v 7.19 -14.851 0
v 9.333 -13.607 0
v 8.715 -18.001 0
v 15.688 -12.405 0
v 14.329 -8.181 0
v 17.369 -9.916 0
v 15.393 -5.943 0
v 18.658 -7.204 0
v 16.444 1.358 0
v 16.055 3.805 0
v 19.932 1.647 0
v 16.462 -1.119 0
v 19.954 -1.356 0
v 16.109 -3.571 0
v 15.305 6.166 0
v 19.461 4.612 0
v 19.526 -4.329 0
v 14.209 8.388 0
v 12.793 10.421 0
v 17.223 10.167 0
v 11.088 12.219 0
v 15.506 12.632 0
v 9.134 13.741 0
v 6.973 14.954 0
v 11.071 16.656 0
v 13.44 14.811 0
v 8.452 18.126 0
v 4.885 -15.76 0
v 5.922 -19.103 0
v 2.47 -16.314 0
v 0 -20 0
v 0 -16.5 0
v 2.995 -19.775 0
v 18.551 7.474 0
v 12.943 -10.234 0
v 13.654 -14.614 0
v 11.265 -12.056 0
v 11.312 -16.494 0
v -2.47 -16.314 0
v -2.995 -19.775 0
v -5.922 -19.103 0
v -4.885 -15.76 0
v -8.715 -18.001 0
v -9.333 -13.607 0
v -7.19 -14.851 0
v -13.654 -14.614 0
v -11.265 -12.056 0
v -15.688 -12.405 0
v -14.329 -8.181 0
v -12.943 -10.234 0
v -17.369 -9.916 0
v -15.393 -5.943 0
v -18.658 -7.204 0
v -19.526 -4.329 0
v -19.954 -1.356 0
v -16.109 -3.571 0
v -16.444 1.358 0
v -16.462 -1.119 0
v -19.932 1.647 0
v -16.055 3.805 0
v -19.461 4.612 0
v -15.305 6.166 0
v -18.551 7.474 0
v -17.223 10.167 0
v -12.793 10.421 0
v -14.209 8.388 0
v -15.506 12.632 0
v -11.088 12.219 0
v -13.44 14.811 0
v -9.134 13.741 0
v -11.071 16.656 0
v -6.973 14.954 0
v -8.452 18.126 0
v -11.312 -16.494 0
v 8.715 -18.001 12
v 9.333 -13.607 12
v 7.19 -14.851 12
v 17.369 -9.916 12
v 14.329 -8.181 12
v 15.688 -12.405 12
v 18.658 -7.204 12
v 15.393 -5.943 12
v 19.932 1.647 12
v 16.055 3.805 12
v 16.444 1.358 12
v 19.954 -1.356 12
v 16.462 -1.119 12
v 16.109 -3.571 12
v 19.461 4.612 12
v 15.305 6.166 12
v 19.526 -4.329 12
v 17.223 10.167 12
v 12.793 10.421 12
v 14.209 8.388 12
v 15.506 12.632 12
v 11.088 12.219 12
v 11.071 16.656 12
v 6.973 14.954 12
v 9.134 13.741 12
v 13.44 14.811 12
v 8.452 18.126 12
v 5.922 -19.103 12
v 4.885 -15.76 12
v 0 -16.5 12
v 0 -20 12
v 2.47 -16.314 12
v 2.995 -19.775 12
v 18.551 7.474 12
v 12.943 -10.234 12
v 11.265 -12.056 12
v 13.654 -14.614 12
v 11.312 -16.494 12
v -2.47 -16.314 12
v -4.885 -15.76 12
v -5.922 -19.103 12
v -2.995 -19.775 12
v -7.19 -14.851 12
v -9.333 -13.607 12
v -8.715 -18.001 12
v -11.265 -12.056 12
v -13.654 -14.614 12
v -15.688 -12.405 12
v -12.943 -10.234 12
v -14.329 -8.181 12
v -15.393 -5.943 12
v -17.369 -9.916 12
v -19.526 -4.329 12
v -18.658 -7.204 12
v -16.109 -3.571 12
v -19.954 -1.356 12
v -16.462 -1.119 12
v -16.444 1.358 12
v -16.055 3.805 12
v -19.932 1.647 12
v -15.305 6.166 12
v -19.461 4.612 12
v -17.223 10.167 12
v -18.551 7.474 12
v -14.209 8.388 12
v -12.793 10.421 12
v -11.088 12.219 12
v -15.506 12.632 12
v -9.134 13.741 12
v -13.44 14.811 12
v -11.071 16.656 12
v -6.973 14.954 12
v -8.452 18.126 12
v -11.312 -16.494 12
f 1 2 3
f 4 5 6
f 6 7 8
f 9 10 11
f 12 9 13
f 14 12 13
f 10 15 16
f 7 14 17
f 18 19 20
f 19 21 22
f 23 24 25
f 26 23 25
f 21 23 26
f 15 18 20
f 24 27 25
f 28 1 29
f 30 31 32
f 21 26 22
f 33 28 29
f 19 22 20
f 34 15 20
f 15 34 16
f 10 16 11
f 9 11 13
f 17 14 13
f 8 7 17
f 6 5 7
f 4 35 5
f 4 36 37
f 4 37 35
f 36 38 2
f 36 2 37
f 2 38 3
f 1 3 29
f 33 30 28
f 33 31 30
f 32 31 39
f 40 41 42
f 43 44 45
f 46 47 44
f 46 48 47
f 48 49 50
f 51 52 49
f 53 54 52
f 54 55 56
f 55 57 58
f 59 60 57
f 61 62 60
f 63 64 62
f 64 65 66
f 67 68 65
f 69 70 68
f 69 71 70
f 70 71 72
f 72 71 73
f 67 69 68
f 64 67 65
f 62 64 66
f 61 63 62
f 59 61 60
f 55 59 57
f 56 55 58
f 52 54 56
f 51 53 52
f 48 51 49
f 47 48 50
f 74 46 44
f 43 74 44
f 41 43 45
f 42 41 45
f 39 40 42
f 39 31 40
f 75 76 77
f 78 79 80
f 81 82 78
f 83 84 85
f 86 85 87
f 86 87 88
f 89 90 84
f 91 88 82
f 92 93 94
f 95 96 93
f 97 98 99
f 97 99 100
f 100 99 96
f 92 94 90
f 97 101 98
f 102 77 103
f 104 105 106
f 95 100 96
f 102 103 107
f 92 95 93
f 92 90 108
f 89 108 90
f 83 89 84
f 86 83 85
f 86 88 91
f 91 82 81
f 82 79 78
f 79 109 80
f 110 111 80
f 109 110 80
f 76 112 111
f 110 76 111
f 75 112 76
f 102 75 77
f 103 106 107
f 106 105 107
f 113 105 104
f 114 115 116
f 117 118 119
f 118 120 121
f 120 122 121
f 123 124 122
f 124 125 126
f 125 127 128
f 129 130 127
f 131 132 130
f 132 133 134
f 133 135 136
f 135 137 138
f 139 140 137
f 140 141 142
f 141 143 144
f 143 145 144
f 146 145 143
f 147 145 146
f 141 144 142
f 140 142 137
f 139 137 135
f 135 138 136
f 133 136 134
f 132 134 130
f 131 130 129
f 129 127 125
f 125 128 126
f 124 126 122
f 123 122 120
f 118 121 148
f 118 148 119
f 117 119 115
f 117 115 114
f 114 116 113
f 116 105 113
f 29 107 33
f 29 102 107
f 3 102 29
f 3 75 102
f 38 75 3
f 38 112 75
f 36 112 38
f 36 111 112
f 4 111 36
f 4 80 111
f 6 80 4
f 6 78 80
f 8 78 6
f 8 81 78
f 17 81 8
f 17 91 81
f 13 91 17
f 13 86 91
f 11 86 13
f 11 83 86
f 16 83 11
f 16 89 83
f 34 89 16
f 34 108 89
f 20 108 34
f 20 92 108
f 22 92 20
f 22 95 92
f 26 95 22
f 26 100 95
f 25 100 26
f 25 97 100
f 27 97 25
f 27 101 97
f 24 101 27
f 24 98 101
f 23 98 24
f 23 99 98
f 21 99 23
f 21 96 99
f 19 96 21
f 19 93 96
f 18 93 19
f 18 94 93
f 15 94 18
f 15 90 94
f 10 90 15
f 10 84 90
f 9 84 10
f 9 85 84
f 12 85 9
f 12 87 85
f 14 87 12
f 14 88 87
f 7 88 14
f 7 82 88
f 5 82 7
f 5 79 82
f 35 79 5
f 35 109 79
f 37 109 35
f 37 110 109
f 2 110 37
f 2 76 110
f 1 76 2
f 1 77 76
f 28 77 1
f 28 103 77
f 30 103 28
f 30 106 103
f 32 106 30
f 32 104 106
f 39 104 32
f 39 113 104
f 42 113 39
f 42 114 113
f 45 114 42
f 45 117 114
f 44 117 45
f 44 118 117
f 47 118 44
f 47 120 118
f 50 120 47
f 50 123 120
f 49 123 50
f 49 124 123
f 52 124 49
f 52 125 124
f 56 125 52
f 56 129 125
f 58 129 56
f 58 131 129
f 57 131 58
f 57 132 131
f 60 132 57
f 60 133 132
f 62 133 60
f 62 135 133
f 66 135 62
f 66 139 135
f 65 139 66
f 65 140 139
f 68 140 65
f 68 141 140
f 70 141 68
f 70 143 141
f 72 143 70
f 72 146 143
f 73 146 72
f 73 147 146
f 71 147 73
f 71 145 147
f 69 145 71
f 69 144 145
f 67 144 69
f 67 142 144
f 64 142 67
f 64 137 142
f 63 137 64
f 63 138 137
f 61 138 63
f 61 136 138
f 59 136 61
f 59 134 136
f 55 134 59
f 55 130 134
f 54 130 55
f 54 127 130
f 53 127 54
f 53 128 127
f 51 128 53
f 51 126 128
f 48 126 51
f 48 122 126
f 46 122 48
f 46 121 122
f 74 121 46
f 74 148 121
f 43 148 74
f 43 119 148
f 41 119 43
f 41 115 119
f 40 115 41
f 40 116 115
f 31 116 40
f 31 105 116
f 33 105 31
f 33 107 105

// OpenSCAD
$fn = 32;

// ----------------------------------------------------------------------
// Spring clip: 40 mm outside, 3.5 mm band, 50 degree opening
// ----------------------------------------------------------------------

// --- parameters (mm) ---
outer_r = 20;             // clip outside radius
inner_r = 16.5;           // clip bore radius
band = 3.5;               // band thickness
clip_w = 12;              // clip width
opening = 50;             // opening angle

clip_profile = [[-8.452, 18.126], [-11.071, 16.656], [-13.44, 14.811], [-15.506, 12.632], [-17.223, 10.167], [-18.551, 7.474], [-19.461, 4.612], [-19.932, 1.647], [-19.954, -1.356], [-19.526, -4.329], [-18.658, -7.204], [-17.369, -9.916], [-15.688, -12.405], [-13.654, -14.614], [-11.312, -16.494], [-8.715, -18.001], [-5.922, -19.103], [-2.995, -19.775], [0, -20], [2.995, -19.775], [5.922, -19.103], [8.715, -18.001], [11.312, -16.494], [13.654, -14.614], [15.688, -12.405], [17.369, -9.916], [18.658, -7.204], [19.526, -4.329], [19.954, -1.356], [19.932, 1.647], [19.461, 4.612], [18.551, 7.474], [17.223, 10.167], [15.506, 12.632], [13.44, 14.811], [11.071, 16.656], [8.452, 18.126], [6.973, 14.954], [9.134, 13.741], [11.088, 12.219], [12.793, 10.421], [14.209, 8.388], [15.305, 6.166], [16.055, 3.805], [16.444, 1.358], [16.462, -1.119], [16.109, -3.571], [15.393, -5.943], [14.329, -8.181], [12.943, -10.234], [11.265, -12.056], [9.333, -13.607], [7.19, -14.851], [4.885, -15.76], [2.47, -16.314], [0, -16.5], [-2.47, -16.314], [-4.885, -15.76], [-7.19, -14.851], [-9.333, -13.607], [-11.265, -12.056], [-12.943, -10.234], [-14.329, -8.181], [-15.393, -5.943], [-16.109, -3.571], [-16.462, -1.119], [-16.444, 1.358], [-16.055, 3.805], [-15.305, 6.166], [-14.209, 8.388], [-12.793, 10.421], [-11.088, 12.219], [-9.134, 13.741], [-6.973, 14.954]];

difference() {
  union() {
    linear_extrude(height = clip_w) polygon(clip_profile);
  }
}
